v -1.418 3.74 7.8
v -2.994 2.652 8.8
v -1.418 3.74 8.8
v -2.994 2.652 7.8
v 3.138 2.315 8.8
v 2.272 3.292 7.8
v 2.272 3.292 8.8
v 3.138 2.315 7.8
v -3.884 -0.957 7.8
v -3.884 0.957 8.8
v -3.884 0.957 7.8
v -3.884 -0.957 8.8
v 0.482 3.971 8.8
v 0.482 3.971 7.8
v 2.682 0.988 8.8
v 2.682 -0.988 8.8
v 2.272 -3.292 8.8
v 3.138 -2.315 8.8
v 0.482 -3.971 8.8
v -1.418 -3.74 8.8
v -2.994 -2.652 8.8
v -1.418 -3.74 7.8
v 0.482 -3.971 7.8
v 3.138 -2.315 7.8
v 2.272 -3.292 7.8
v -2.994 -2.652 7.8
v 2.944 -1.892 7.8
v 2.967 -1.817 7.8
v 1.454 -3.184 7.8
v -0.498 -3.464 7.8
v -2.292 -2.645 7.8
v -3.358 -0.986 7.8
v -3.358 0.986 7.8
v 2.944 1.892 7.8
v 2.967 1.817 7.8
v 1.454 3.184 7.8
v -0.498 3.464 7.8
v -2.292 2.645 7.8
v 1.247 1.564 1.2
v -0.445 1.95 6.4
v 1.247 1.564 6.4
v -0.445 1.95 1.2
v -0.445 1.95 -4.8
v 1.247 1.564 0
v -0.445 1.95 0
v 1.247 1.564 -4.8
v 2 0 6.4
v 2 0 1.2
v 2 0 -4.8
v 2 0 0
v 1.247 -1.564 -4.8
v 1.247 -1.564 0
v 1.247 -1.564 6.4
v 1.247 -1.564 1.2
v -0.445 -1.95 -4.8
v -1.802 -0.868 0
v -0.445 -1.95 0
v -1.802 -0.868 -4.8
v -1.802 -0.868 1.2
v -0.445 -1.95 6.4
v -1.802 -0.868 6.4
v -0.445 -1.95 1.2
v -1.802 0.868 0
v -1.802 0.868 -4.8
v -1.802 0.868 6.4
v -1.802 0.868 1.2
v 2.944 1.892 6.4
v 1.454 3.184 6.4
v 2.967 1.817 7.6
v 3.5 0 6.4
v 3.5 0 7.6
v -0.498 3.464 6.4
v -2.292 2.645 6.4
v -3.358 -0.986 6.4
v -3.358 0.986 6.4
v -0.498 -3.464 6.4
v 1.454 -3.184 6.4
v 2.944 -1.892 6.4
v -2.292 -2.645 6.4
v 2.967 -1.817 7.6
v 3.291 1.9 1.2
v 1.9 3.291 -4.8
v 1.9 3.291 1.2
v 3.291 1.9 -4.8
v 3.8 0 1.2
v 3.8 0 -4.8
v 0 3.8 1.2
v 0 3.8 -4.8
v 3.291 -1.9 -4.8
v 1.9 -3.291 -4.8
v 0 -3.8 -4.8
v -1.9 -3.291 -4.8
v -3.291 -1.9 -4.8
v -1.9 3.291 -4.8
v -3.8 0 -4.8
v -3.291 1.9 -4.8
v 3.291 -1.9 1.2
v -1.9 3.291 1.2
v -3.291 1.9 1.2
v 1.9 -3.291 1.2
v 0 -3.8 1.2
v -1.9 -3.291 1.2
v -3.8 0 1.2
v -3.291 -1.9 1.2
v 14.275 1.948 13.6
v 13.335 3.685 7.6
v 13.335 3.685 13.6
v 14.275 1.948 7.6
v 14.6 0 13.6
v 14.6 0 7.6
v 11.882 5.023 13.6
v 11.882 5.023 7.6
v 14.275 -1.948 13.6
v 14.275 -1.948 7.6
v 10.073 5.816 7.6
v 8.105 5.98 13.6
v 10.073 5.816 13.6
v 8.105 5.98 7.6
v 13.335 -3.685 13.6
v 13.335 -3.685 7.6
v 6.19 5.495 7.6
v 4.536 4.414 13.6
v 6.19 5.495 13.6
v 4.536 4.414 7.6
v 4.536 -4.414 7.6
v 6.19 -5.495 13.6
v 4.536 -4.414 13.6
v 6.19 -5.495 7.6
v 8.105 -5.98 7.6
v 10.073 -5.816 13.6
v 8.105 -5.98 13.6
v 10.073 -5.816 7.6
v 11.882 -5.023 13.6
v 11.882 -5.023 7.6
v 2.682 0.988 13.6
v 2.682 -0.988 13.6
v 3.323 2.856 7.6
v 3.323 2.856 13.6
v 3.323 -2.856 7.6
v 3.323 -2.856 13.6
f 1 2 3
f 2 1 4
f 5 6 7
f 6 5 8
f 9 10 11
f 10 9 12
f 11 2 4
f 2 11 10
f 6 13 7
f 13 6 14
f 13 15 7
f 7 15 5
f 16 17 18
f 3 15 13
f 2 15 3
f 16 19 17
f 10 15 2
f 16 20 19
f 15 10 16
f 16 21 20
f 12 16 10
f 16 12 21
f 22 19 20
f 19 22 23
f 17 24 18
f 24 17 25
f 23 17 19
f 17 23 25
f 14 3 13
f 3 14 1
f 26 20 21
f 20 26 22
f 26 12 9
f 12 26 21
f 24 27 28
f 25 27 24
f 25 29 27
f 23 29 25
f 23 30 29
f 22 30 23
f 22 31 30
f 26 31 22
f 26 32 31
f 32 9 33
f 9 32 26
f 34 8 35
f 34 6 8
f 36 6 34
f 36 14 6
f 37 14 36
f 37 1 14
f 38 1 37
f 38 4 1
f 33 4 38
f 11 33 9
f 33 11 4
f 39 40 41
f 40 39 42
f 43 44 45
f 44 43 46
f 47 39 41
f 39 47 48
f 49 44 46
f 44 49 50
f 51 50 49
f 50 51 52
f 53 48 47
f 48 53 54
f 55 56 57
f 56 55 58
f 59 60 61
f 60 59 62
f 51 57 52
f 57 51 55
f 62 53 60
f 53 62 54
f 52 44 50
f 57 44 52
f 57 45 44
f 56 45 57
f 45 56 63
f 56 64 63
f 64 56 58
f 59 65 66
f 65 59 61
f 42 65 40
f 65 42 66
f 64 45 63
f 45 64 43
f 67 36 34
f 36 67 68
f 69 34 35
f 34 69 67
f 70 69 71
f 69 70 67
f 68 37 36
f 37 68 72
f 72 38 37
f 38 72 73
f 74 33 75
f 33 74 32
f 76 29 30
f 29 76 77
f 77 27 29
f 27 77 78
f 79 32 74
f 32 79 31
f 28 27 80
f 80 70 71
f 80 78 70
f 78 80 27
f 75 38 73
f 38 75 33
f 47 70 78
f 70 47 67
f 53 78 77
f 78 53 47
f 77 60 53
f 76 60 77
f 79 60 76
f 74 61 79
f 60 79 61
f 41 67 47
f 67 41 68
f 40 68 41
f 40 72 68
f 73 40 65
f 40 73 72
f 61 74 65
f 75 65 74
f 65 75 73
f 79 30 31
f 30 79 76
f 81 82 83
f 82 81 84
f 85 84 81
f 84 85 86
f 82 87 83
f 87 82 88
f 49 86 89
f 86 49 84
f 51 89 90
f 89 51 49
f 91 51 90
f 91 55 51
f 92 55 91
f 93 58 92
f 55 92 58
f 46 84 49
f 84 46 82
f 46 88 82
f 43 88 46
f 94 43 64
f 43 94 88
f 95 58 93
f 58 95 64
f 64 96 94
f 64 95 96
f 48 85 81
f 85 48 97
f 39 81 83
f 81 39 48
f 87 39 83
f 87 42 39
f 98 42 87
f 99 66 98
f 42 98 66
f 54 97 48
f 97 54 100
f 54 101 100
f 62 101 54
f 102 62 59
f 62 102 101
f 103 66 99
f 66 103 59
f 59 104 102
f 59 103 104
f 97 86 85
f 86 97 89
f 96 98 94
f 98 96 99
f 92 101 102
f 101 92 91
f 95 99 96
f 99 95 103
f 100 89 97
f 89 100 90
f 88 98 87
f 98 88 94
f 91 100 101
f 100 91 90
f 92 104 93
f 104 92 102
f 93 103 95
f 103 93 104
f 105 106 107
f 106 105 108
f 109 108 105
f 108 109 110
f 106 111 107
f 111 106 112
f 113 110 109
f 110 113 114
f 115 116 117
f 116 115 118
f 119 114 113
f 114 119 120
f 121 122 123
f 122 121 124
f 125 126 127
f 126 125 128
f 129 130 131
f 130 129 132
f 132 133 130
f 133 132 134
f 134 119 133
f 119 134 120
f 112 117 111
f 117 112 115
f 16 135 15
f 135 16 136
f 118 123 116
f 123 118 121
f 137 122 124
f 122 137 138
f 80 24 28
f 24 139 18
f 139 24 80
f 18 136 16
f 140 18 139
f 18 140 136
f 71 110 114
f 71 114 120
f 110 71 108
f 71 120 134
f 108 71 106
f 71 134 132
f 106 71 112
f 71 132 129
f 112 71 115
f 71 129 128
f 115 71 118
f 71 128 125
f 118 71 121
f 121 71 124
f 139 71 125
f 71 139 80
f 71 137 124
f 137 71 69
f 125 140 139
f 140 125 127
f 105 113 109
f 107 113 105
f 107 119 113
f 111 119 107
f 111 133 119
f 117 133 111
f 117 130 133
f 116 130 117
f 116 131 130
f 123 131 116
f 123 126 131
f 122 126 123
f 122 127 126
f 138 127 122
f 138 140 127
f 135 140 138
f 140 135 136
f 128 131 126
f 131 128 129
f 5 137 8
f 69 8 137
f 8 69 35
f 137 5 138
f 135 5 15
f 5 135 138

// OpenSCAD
// Parameters
shaft_diameter_mm = 4.0; //[2.0:8.0:0.1]
length_mm = 10.0; //[5.0:20.0:0.5]
head_diameter_mm = 7.0; //[3.5:14.0:0.1]
head_height_mm = 2.4; //[1.2:4.8:0.1]
overlap_mm = 1.2; //[0.5:2.0:0.1]  // use 1-2mm to guarantee connection

washer_outer_diameter_mm = 8.0; //[4.0:16.0:0.1]
washer_thickness_mm = 1.0; //[0.5:2.0:0.1]

spacer_height_mm = 6.0; //[3.0:12.0:0.5]
spacer_wall_mm = 1.8; //[0.9:3.6:0.1]

buzzer_diameter_mm = 12.0; //[6.0:24.0:0.5]
buzzer_height_mm = 6.0; //[3.0:12.0:0.5]

// Derived
shaft_len_mm = length_mm - head_height_mm;

// Radii
shaft_r = shaft_diameter_mm/2;
head_r  = head_diameter_mm/2;
washer_r = washer_outer_diameter_mm/2;

spacer_outer_r = shaft_r + spacer_wall_mm;
buzzer_r = buzzer_diameter_mm/2;

// Z positions (centered primitives), with guaranteed overlaps
z_shaft_center  = shaft_len_mm/2;                                  // shaft spans [0 .. shaft_len]
z_head_center   = shaft_len_mm + head_height_mm/2 - overlap_mm;     // overlaps into shaft
z_washer_center = shaft_len_mm - washer_thickness_mm/2 + overlap_mm;// overlaps into shaft (under head)
z_spacer_center = -spacer_height_mm/2 + overlap_mm;                // overlaps into shaft at z=0

// Buzzer attachment: ensure it intersects BOTH spacer and screw assembly.
// 1) Radial overlap into spacer wall
buzzer_attach_overlap_mm = overlap_mm;
buzzer_center_x = spacer_outer_r + buzzer_r - buzzer_attach_overlap_mm;

// 2) Vertical overlap into washer/head region so it cannot float relative to screw
// Place buzzer so its bottom slightly intersects the washer top (or head underside).
// Washer top Z = (z_washer_center + washer_thickness/2)
z_washer_top = z_washer_center + washer_thickness_mm/2;
z_buzzer_center = z_washer_top + buzzer_height_mm/2 - overlap_mm;

// Screw and Washer - complete geometry
module screw_and_washer() {
  // Shaft
  translate([0, 0, z_shaft_center])
    cylinder(h=shaft_len_mm, r=shaft_r, center=true);

  // Head (overlaps shaft)
  translate([0, 0, z_head_center])
    cylinder(h=head_height_mm, r=head_r, center=true);

  // Washer (overlaps shaft)
  difference() {
    translate([0, 0, z_washer_center])
      cylinder(h=washer_thickness_mm, r=washer_r, center=true);
    translate([0, 0, z_washer_center])
      cylinder(h=washer_thickness_mm + 2*overlap_mm, r=shaft_r, center=true);
  }
}

// PCB Spacer - complete geometry (overlaps shaft at z=0)
module pcb_spacer() {
  difference() {
    translate([0, 0, z_spacer_center])
      cylinder(h=spacer_height_mm, r=spacer_outer_r, center=true);
    translate([0, 0, z_spacer_center])
      cylinder(h=spacer_height_mm + 2*overlap_mm, r=shaft_r, center=true);
  }
}

// Buzzer - attached with radial overlap into spacer AND vertical overlap into washer/head
module buzzer() {
  translate([buzzer_center_x, 0, z_buzzer_center])
    cylinder(h=buzzer_height_mm, r=buzzer_r, center=true);
}

// Assembly (single connected solid)
module assembly() {
  union() {
    // Colors kept for preview; union ensures one connected solid
    color("DimGray") screw_and_washer();
    color("Silver")  pcb_spacer();
    color("Black")   buzzer();
  }
}

assembly();
